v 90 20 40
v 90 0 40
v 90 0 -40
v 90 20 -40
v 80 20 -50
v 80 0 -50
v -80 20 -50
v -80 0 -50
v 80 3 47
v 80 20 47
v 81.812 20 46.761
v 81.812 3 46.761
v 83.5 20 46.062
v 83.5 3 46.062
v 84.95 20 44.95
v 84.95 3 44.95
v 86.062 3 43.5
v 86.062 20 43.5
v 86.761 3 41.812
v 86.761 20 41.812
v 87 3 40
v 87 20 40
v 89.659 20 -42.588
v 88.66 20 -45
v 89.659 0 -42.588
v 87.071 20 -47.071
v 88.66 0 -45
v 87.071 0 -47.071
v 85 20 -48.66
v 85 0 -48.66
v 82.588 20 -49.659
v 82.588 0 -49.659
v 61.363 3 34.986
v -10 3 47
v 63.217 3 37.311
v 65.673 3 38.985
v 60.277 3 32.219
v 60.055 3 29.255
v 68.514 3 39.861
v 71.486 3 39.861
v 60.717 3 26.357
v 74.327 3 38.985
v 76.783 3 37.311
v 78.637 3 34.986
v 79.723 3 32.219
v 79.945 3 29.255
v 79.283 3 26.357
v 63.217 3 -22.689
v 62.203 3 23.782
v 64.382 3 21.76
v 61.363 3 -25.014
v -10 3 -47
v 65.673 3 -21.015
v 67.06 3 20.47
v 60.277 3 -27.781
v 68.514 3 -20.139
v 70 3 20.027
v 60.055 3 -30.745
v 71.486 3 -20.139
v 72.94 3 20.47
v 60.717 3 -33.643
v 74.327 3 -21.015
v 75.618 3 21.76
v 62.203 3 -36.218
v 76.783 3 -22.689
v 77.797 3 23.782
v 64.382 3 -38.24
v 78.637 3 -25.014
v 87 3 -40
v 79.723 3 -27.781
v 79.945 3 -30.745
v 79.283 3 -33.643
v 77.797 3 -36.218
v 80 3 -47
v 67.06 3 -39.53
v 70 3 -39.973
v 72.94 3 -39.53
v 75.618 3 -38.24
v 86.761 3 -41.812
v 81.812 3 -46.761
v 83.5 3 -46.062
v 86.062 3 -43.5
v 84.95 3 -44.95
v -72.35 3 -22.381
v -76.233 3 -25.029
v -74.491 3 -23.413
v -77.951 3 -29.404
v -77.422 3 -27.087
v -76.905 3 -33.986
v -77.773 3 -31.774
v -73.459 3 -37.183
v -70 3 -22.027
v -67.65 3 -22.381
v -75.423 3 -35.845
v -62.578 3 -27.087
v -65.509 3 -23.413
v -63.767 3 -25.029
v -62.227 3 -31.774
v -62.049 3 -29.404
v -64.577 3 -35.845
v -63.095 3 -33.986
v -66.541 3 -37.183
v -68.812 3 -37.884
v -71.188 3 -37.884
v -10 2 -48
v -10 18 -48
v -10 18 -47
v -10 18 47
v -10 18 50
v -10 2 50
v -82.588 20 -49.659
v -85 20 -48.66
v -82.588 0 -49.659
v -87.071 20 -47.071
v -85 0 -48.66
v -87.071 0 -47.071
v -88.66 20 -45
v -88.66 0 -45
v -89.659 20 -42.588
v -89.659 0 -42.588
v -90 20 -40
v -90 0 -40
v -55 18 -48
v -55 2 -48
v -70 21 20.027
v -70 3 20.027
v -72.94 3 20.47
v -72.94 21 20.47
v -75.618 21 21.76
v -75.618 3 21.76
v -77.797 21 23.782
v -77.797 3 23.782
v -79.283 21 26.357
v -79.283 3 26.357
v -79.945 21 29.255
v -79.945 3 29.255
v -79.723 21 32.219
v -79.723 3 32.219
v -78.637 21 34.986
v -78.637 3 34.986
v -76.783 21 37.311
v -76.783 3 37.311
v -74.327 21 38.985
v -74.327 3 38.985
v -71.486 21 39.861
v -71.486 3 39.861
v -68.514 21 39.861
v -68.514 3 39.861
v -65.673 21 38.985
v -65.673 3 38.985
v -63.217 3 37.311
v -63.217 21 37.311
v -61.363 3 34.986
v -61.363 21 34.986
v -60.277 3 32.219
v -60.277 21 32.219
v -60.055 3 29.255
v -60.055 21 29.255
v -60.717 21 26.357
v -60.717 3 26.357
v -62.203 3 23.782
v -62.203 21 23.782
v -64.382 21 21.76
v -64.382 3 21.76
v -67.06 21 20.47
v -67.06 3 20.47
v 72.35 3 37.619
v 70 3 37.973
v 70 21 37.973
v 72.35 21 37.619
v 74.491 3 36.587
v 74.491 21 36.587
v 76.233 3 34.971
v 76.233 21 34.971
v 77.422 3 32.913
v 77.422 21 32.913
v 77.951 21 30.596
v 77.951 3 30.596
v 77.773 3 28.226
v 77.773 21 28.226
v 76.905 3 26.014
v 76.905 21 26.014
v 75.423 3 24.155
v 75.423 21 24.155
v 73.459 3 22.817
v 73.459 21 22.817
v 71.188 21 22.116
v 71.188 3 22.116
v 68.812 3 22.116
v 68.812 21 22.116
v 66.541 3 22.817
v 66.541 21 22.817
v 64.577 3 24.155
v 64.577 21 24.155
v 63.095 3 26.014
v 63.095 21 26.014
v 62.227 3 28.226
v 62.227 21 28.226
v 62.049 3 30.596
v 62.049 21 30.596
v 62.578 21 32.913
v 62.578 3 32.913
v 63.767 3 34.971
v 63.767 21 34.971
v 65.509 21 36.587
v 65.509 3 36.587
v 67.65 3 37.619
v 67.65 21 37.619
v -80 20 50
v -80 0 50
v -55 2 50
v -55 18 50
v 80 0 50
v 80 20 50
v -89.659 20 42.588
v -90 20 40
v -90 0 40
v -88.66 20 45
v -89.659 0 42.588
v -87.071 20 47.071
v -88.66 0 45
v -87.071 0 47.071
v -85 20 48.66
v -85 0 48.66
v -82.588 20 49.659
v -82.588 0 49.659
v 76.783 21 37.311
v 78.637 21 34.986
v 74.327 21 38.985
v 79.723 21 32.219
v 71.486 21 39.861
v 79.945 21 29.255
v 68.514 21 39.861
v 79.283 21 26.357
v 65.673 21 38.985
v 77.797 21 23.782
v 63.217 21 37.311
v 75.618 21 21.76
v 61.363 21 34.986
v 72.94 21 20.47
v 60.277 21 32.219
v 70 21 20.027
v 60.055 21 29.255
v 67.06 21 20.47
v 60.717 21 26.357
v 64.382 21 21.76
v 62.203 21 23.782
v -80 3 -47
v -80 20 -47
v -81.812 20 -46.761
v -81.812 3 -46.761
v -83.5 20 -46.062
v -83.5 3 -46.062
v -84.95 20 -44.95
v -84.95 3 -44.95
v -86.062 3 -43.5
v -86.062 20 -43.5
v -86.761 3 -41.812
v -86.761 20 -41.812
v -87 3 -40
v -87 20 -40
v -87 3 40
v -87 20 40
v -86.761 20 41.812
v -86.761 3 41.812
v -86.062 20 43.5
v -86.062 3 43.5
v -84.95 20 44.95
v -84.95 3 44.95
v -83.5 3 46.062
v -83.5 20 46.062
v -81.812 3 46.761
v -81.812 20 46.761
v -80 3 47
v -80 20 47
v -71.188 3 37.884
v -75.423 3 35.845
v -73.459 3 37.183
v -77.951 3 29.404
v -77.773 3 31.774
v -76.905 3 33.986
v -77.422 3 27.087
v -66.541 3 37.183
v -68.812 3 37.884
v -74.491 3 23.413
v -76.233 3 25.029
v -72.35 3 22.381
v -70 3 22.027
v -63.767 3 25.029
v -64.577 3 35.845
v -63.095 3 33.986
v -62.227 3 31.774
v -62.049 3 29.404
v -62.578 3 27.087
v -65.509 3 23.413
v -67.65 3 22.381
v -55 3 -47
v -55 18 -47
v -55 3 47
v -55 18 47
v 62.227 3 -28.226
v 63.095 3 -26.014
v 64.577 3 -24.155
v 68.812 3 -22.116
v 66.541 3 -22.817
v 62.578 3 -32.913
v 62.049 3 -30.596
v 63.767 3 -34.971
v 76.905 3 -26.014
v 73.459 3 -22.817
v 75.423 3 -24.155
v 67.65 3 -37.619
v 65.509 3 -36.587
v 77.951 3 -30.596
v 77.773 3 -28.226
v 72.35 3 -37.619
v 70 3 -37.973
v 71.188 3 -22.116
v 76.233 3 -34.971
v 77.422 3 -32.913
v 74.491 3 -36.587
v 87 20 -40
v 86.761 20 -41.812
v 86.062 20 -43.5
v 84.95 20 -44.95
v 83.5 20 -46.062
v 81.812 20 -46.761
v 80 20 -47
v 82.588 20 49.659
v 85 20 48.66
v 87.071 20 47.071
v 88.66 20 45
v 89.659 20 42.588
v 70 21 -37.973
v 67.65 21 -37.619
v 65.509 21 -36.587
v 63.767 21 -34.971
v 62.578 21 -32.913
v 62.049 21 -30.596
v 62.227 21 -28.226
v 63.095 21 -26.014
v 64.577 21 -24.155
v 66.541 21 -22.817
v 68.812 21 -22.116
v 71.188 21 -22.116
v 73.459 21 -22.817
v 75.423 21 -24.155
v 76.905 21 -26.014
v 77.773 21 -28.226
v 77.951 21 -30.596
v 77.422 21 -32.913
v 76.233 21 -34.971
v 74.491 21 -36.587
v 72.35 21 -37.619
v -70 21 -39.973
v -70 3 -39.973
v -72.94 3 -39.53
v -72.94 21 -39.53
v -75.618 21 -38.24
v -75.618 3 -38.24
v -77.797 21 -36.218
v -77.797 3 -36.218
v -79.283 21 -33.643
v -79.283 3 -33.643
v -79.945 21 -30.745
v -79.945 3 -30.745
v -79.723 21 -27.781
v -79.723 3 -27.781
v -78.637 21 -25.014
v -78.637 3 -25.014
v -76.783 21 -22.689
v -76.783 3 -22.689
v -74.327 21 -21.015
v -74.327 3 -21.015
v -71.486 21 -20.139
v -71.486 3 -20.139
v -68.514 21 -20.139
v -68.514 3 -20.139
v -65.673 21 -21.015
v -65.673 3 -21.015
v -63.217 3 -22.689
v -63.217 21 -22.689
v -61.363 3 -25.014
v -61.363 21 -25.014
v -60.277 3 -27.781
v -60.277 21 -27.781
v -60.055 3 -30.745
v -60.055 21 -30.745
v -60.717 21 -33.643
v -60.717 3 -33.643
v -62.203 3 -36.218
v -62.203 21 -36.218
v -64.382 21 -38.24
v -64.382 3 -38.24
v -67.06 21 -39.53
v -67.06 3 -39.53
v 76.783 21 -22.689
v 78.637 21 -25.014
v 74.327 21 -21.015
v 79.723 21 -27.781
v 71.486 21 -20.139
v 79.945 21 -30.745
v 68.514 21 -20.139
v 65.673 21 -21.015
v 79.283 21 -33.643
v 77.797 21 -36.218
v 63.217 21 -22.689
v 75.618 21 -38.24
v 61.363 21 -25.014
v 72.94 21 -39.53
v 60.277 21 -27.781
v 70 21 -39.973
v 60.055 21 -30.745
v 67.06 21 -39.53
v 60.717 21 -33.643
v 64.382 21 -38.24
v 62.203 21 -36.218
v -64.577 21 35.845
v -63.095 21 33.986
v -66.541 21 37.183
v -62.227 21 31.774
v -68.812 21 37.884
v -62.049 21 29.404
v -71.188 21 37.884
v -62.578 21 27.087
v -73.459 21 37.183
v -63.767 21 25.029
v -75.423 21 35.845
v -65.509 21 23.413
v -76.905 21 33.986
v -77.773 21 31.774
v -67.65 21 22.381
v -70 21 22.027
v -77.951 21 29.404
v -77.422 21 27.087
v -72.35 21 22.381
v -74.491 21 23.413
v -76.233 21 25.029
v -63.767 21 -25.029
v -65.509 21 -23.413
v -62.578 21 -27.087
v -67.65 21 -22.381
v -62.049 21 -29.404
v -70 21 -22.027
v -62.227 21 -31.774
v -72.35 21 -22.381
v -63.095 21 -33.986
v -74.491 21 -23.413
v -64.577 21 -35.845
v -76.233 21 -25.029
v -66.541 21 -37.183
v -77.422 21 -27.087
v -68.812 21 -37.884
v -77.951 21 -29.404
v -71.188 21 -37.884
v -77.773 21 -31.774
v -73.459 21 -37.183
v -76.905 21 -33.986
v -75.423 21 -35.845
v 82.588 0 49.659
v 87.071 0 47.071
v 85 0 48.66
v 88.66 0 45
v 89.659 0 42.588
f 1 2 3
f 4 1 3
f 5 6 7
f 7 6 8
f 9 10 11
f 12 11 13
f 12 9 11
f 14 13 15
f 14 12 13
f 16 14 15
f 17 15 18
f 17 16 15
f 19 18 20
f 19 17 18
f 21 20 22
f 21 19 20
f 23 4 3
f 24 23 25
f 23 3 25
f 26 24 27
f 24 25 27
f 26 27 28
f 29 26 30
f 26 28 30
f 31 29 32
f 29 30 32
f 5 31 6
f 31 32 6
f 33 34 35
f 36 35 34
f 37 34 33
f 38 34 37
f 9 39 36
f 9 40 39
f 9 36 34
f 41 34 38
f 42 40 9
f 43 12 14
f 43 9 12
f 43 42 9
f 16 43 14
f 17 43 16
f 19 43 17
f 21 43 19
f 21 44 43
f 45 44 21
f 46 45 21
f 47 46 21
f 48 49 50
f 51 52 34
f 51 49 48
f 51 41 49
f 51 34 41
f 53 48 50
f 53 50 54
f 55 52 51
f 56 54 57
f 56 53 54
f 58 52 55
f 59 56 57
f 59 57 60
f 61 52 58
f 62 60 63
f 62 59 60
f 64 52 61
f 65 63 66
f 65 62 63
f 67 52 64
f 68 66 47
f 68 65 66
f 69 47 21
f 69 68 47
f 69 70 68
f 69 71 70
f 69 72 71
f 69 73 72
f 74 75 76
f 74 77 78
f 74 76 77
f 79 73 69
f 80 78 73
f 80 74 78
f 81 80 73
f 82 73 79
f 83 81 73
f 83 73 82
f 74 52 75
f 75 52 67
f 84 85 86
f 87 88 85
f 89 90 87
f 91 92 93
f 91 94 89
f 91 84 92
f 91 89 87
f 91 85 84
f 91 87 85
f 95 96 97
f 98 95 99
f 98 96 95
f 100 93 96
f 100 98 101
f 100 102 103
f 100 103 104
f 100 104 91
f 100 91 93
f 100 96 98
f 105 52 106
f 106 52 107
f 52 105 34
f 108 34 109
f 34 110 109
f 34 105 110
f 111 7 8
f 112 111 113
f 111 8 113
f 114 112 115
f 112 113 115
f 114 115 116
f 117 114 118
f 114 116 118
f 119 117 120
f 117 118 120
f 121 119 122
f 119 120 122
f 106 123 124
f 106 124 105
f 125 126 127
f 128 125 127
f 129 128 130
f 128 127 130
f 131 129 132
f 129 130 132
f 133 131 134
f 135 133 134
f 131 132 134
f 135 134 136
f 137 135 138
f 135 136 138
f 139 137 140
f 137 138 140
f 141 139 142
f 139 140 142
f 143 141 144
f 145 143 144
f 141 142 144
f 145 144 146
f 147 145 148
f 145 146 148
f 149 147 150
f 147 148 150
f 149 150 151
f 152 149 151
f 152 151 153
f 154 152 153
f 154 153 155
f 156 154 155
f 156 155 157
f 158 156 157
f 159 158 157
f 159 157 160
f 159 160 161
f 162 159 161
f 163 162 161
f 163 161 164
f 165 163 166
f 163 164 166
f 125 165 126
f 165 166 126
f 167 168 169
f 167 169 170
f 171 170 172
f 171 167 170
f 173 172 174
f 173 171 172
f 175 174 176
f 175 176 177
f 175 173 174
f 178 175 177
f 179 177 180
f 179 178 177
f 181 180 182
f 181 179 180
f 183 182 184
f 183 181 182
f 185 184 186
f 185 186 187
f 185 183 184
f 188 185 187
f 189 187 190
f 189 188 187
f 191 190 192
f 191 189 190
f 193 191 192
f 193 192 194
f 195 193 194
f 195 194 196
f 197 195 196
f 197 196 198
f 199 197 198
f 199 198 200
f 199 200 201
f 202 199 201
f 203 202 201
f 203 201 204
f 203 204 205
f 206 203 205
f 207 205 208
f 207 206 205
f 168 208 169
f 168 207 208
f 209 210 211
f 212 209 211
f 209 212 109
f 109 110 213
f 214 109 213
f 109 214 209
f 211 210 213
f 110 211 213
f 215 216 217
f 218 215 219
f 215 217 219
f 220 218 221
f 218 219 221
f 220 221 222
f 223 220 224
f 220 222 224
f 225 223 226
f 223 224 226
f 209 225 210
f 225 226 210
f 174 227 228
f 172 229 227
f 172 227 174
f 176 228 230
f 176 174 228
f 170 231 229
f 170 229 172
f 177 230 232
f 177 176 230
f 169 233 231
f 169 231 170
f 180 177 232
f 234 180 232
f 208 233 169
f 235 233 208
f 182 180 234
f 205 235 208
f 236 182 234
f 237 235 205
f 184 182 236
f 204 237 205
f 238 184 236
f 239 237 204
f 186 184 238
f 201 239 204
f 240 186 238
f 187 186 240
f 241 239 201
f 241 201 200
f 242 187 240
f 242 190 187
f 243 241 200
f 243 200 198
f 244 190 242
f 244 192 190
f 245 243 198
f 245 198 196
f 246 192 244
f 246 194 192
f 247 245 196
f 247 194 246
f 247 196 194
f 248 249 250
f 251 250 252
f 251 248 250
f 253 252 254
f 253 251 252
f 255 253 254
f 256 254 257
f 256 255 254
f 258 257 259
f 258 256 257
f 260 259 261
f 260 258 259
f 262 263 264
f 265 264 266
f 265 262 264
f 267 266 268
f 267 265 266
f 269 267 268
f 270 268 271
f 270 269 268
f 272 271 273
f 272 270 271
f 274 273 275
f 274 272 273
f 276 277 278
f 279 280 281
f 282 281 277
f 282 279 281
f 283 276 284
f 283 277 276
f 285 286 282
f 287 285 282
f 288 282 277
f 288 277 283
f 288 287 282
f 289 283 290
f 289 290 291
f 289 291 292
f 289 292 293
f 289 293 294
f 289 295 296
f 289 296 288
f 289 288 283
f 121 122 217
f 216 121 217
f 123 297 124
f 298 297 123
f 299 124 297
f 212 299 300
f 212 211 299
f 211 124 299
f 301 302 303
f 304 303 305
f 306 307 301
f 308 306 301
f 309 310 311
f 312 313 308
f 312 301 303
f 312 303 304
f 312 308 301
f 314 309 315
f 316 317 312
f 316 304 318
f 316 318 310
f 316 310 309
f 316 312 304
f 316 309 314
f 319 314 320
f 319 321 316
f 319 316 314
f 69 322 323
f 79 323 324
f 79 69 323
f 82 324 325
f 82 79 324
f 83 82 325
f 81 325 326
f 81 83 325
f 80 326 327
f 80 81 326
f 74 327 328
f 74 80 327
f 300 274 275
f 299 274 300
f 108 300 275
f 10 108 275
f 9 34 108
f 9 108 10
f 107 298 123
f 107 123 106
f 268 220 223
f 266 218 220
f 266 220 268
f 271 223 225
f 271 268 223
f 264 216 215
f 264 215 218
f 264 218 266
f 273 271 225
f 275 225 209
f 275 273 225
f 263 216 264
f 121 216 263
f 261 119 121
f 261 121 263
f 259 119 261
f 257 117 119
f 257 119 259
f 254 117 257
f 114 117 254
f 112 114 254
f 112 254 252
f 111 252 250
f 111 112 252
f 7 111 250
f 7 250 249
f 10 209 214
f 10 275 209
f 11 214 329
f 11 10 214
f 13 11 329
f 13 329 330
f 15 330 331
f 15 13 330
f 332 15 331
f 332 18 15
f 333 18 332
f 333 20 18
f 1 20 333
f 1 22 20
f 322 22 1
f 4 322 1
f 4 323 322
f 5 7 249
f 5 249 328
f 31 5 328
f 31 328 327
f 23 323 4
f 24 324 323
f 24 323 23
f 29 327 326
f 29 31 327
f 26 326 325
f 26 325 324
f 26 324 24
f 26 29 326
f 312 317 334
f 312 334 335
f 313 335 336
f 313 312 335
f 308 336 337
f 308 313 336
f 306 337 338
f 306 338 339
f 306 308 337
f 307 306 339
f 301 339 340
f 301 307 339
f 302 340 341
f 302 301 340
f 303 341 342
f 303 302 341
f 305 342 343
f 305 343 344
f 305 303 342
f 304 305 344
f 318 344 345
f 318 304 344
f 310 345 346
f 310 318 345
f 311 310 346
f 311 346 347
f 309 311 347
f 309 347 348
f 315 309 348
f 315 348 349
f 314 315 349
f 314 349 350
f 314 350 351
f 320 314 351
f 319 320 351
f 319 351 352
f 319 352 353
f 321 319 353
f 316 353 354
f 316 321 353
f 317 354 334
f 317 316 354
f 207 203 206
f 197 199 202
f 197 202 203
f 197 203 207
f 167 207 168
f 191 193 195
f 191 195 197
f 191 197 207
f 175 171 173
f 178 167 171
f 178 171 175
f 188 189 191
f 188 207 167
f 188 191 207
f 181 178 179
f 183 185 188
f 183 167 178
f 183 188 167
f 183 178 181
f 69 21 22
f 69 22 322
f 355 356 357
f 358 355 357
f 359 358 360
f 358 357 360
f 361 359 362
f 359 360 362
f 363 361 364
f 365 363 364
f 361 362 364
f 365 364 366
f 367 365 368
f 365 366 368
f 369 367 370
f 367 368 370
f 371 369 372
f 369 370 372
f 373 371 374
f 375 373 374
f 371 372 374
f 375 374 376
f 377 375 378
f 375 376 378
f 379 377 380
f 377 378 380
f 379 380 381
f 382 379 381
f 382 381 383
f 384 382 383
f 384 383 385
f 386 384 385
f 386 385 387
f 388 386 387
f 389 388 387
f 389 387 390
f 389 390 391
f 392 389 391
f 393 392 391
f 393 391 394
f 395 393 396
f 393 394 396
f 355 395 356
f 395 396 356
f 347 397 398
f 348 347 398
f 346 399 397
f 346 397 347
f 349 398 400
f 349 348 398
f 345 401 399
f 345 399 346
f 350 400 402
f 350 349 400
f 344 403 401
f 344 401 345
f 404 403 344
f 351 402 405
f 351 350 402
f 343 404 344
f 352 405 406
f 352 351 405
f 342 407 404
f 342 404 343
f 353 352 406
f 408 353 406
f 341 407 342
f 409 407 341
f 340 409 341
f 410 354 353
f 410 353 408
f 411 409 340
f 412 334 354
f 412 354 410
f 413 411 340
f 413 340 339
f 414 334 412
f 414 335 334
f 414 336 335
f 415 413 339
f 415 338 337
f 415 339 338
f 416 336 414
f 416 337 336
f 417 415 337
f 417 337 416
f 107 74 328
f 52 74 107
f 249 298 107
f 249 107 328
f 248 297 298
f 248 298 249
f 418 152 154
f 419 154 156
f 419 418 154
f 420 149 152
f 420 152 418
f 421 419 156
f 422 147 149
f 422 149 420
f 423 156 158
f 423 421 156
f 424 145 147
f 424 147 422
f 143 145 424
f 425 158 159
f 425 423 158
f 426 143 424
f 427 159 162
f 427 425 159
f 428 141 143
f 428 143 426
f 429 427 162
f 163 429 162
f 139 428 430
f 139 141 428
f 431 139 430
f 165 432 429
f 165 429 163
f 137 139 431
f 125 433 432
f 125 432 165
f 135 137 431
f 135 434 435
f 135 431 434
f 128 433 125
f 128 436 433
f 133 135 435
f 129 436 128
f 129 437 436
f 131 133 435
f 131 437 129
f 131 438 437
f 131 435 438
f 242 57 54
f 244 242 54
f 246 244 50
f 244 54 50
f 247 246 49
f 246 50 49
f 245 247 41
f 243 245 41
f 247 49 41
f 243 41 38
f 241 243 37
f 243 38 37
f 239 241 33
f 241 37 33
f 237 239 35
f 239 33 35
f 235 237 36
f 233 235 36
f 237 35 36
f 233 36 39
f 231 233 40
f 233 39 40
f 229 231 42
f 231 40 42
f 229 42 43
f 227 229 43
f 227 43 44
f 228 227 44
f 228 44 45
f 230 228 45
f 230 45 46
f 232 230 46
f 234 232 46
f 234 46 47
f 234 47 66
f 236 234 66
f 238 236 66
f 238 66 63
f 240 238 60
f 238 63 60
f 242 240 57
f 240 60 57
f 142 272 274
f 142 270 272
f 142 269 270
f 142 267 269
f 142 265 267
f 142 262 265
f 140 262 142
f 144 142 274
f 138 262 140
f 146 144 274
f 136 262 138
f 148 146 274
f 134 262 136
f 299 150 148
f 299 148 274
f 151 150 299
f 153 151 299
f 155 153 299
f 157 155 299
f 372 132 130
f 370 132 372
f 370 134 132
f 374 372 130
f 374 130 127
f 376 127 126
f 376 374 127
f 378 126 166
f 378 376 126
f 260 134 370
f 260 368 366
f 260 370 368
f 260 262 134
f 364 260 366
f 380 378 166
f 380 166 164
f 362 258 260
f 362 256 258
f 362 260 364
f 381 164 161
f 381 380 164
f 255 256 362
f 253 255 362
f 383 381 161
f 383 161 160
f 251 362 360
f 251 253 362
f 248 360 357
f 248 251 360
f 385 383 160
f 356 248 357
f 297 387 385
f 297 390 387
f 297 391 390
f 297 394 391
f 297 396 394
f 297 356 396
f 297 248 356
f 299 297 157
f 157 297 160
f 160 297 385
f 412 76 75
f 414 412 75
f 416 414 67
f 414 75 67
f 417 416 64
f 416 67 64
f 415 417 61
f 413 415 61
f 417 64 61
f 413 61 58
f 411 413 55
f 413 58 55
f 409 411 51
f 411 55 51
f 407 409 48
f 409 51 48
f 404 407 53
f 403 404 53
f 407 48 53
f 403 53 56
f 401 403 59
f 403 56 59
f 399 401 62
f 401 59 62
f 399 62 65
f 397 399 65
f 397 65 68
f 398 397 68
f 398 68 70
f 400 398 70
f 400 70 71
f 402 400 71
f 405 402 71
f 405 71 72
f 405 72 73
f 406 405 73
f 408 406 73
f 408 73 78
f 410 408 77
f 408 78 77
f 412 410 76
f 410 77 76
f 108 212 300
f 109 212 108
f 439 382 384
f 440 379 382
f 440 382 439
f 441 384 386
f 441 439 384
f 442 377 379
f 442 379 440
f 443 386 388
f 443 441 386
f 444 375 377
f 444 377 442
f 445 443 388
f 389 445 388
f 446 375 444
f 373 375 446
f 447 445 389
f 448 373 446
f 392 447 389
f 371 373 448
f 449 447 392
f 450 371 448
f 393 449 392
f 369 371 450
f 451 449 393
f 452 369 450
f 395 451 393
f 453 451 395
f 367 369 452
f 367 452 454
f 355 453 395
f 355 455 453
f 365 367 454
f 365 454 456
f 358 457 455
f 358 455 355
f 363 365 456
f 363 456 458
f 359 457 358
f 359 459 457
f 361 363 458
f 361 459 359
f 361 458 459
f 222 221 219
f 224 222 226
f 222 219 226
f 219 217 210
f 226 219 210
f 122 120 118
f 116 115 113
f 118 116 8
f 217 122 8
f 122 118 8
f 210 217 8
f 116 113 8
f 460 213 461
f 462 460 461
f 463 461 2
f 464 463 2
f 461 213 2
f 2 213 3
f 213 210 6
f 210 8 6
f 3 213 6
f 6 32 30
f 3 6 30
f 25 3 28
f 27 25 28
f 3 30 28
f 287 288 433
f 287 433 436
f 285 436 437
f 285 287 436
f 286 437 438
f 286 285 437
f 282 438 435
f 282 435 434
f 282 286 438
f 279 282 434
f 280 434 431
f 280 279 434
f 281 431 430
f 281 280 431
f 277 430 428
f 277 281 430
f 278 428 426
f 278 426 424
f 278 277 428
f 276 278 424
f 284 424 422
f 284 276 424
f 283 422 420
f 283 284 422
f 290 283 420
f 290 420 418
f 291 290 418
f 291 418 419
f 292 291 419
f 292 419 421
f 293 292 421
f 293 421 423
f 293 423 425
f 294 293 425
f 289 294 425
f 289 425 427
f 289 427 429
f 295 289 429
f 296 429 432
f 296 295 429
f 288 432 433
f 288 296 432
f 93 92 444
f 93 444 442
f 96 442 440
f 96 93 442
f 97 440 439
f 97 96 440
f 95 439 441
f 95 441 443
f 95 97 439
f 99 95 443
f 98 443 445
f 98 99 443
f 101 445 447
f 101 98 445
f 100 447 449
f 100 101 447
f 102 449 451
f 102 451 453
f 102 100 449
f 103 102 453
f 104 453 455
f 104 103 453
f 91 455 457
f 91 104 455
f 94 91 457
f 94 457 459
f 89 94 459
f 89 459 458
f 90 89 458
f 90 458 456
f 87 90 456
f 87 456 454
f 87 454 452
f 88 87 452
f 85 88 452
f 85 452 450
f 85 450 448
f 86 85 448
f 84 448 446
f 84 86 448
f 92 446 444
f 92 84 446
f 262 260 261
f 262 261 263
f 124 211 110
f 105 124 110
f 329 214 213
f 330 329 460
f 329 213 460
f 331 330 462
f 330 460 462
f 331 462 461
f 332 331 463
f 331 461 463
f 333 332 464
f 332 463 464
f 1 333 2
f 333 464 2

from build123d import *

# Parameters (mm, degrees)
BOSS_EXTRUDE1_DEPTH = 20
SHELL1_T            = -3
SKETCH3_R           = 9.972851257
SKETCH3_R_2         = 7.972851257
BOSS_EXTRUDE2_DEPTH = 18
SKETCH4_W           = 45
SKETCH4_H           = 16
CUT_EXTRUDE2_DEPTH  = 98


with BuildPart() as part:
    # Sketch1 → Boss-Extrude1 (new body)
    with BuildSketch(Plane(origin=(0, 0, 0), x_dir=(1, 0, 0), z_dir=(0, 1, 0))):
        with BuildLine():
            Line((-80, -50), (80, -50))
            ThreePointArc((80, -50), (87.071067812, -47.071067812), (90, -40))
            Line((90, -40), (90, 40))
            ThreePointArc((90, 40), (87.071067812, 47.071067812), (80, 50))
            Line((80, 50), (-80, 50))
            ThreePointArc((-80, 50), (-87.071067812, 47.071067812), (-90, 40))
            Line((-90, 40), (-90, -40))
            ThreePointArc((-90, -40), (-87.071067812, -47.071067812), (-80, -50))
        make_face()
    extrude(amount=BOSS_EXTRUDE1_DEPTH)

    # Shell1
    shell1_openings = [part.faces().sort_by_distance(p)[0] for p in [
        (0, 20, 0),
    ]]
    offset(amount=SHELL1_T, openings=shell1_openings, kind=Kind.INTERSECTION)

    # Sketch3 → Boss-Extrude2 (add)
    # profile 1 of 4: a face of its own
    with BuildSketch(Plane(origin=(0, 3, 0), x_dir=(1, 0, 0), z_dir=(0, 1, 0))):
        with Locations(Location((-70, 30, 0), (0, 0, 90))):
            Circle(SKETCH3_R)
        with Locations(Location((-70, 30, 0), (0, 0, 270))):
            Circle(SKETCH3_R_2, mode=Mode.SUBTRACT)
    # profile 2 of 4: a face of its own
    with BuildSketch(Plane(origin=(0, 3, 0), x_dir=(1, 0, 0), z_dir=(0, 1, 0))):
        with Locations(Location((70, 30, 0), (0, 0, 90))):
            Circle(SKETCH3_R)
        with Locations(Location((70, 30, 0), (0, 0, 90))):
            Circle(SKETCH3_R_2, mode=Mode.SUBTRACT)
    # profile 3 of 4: a face of its own
    with BuildSketch(Plane(origin=(0, 3, 0), x_dir=(1, 0, 0), z_dir=(0, 1, 0))):
        with Locations(Location((70, -30, 0), (0, 0, 90))):
            Circle(SKETCH3_R)
        with Locations(Location((70, -30, 0), (0, 0, 270))):
            Circle(SKETCH3_R_2, mode=Mode.SUBTRACT)
    # profile 4 of 4: a face of its own
    with BuildSketch(Plane(origin=(0, 3, 0), x_dir=(1, 0, 0), z_dir=(0, 1, 0))):
        with Locations(Location((-70, -30, 0), (0, 0, 90))):
            Circle(SKETCH3_R)
        with Locations(Location((-70, -30, 0), (0, 0, 90))):
            Circle(SKETCH3_R_2, mode=Mode.SUBTRACT)
    extrude(amount=BOSS_EXTRUDE2_DEPTH)

    # Sketch4 → Cut-Extrude2 (cut)
    with BuildSketch(Plane.XY.offset(50)):
        with Locations((-32.5, 10)):
            Rectangle(SKETCH4_W, SKETCH4_H)
    extrude(amount=-CUT_EXTRUDE2_DEPTH, mode=Mode.SUBTRACT)


solid = part.part
